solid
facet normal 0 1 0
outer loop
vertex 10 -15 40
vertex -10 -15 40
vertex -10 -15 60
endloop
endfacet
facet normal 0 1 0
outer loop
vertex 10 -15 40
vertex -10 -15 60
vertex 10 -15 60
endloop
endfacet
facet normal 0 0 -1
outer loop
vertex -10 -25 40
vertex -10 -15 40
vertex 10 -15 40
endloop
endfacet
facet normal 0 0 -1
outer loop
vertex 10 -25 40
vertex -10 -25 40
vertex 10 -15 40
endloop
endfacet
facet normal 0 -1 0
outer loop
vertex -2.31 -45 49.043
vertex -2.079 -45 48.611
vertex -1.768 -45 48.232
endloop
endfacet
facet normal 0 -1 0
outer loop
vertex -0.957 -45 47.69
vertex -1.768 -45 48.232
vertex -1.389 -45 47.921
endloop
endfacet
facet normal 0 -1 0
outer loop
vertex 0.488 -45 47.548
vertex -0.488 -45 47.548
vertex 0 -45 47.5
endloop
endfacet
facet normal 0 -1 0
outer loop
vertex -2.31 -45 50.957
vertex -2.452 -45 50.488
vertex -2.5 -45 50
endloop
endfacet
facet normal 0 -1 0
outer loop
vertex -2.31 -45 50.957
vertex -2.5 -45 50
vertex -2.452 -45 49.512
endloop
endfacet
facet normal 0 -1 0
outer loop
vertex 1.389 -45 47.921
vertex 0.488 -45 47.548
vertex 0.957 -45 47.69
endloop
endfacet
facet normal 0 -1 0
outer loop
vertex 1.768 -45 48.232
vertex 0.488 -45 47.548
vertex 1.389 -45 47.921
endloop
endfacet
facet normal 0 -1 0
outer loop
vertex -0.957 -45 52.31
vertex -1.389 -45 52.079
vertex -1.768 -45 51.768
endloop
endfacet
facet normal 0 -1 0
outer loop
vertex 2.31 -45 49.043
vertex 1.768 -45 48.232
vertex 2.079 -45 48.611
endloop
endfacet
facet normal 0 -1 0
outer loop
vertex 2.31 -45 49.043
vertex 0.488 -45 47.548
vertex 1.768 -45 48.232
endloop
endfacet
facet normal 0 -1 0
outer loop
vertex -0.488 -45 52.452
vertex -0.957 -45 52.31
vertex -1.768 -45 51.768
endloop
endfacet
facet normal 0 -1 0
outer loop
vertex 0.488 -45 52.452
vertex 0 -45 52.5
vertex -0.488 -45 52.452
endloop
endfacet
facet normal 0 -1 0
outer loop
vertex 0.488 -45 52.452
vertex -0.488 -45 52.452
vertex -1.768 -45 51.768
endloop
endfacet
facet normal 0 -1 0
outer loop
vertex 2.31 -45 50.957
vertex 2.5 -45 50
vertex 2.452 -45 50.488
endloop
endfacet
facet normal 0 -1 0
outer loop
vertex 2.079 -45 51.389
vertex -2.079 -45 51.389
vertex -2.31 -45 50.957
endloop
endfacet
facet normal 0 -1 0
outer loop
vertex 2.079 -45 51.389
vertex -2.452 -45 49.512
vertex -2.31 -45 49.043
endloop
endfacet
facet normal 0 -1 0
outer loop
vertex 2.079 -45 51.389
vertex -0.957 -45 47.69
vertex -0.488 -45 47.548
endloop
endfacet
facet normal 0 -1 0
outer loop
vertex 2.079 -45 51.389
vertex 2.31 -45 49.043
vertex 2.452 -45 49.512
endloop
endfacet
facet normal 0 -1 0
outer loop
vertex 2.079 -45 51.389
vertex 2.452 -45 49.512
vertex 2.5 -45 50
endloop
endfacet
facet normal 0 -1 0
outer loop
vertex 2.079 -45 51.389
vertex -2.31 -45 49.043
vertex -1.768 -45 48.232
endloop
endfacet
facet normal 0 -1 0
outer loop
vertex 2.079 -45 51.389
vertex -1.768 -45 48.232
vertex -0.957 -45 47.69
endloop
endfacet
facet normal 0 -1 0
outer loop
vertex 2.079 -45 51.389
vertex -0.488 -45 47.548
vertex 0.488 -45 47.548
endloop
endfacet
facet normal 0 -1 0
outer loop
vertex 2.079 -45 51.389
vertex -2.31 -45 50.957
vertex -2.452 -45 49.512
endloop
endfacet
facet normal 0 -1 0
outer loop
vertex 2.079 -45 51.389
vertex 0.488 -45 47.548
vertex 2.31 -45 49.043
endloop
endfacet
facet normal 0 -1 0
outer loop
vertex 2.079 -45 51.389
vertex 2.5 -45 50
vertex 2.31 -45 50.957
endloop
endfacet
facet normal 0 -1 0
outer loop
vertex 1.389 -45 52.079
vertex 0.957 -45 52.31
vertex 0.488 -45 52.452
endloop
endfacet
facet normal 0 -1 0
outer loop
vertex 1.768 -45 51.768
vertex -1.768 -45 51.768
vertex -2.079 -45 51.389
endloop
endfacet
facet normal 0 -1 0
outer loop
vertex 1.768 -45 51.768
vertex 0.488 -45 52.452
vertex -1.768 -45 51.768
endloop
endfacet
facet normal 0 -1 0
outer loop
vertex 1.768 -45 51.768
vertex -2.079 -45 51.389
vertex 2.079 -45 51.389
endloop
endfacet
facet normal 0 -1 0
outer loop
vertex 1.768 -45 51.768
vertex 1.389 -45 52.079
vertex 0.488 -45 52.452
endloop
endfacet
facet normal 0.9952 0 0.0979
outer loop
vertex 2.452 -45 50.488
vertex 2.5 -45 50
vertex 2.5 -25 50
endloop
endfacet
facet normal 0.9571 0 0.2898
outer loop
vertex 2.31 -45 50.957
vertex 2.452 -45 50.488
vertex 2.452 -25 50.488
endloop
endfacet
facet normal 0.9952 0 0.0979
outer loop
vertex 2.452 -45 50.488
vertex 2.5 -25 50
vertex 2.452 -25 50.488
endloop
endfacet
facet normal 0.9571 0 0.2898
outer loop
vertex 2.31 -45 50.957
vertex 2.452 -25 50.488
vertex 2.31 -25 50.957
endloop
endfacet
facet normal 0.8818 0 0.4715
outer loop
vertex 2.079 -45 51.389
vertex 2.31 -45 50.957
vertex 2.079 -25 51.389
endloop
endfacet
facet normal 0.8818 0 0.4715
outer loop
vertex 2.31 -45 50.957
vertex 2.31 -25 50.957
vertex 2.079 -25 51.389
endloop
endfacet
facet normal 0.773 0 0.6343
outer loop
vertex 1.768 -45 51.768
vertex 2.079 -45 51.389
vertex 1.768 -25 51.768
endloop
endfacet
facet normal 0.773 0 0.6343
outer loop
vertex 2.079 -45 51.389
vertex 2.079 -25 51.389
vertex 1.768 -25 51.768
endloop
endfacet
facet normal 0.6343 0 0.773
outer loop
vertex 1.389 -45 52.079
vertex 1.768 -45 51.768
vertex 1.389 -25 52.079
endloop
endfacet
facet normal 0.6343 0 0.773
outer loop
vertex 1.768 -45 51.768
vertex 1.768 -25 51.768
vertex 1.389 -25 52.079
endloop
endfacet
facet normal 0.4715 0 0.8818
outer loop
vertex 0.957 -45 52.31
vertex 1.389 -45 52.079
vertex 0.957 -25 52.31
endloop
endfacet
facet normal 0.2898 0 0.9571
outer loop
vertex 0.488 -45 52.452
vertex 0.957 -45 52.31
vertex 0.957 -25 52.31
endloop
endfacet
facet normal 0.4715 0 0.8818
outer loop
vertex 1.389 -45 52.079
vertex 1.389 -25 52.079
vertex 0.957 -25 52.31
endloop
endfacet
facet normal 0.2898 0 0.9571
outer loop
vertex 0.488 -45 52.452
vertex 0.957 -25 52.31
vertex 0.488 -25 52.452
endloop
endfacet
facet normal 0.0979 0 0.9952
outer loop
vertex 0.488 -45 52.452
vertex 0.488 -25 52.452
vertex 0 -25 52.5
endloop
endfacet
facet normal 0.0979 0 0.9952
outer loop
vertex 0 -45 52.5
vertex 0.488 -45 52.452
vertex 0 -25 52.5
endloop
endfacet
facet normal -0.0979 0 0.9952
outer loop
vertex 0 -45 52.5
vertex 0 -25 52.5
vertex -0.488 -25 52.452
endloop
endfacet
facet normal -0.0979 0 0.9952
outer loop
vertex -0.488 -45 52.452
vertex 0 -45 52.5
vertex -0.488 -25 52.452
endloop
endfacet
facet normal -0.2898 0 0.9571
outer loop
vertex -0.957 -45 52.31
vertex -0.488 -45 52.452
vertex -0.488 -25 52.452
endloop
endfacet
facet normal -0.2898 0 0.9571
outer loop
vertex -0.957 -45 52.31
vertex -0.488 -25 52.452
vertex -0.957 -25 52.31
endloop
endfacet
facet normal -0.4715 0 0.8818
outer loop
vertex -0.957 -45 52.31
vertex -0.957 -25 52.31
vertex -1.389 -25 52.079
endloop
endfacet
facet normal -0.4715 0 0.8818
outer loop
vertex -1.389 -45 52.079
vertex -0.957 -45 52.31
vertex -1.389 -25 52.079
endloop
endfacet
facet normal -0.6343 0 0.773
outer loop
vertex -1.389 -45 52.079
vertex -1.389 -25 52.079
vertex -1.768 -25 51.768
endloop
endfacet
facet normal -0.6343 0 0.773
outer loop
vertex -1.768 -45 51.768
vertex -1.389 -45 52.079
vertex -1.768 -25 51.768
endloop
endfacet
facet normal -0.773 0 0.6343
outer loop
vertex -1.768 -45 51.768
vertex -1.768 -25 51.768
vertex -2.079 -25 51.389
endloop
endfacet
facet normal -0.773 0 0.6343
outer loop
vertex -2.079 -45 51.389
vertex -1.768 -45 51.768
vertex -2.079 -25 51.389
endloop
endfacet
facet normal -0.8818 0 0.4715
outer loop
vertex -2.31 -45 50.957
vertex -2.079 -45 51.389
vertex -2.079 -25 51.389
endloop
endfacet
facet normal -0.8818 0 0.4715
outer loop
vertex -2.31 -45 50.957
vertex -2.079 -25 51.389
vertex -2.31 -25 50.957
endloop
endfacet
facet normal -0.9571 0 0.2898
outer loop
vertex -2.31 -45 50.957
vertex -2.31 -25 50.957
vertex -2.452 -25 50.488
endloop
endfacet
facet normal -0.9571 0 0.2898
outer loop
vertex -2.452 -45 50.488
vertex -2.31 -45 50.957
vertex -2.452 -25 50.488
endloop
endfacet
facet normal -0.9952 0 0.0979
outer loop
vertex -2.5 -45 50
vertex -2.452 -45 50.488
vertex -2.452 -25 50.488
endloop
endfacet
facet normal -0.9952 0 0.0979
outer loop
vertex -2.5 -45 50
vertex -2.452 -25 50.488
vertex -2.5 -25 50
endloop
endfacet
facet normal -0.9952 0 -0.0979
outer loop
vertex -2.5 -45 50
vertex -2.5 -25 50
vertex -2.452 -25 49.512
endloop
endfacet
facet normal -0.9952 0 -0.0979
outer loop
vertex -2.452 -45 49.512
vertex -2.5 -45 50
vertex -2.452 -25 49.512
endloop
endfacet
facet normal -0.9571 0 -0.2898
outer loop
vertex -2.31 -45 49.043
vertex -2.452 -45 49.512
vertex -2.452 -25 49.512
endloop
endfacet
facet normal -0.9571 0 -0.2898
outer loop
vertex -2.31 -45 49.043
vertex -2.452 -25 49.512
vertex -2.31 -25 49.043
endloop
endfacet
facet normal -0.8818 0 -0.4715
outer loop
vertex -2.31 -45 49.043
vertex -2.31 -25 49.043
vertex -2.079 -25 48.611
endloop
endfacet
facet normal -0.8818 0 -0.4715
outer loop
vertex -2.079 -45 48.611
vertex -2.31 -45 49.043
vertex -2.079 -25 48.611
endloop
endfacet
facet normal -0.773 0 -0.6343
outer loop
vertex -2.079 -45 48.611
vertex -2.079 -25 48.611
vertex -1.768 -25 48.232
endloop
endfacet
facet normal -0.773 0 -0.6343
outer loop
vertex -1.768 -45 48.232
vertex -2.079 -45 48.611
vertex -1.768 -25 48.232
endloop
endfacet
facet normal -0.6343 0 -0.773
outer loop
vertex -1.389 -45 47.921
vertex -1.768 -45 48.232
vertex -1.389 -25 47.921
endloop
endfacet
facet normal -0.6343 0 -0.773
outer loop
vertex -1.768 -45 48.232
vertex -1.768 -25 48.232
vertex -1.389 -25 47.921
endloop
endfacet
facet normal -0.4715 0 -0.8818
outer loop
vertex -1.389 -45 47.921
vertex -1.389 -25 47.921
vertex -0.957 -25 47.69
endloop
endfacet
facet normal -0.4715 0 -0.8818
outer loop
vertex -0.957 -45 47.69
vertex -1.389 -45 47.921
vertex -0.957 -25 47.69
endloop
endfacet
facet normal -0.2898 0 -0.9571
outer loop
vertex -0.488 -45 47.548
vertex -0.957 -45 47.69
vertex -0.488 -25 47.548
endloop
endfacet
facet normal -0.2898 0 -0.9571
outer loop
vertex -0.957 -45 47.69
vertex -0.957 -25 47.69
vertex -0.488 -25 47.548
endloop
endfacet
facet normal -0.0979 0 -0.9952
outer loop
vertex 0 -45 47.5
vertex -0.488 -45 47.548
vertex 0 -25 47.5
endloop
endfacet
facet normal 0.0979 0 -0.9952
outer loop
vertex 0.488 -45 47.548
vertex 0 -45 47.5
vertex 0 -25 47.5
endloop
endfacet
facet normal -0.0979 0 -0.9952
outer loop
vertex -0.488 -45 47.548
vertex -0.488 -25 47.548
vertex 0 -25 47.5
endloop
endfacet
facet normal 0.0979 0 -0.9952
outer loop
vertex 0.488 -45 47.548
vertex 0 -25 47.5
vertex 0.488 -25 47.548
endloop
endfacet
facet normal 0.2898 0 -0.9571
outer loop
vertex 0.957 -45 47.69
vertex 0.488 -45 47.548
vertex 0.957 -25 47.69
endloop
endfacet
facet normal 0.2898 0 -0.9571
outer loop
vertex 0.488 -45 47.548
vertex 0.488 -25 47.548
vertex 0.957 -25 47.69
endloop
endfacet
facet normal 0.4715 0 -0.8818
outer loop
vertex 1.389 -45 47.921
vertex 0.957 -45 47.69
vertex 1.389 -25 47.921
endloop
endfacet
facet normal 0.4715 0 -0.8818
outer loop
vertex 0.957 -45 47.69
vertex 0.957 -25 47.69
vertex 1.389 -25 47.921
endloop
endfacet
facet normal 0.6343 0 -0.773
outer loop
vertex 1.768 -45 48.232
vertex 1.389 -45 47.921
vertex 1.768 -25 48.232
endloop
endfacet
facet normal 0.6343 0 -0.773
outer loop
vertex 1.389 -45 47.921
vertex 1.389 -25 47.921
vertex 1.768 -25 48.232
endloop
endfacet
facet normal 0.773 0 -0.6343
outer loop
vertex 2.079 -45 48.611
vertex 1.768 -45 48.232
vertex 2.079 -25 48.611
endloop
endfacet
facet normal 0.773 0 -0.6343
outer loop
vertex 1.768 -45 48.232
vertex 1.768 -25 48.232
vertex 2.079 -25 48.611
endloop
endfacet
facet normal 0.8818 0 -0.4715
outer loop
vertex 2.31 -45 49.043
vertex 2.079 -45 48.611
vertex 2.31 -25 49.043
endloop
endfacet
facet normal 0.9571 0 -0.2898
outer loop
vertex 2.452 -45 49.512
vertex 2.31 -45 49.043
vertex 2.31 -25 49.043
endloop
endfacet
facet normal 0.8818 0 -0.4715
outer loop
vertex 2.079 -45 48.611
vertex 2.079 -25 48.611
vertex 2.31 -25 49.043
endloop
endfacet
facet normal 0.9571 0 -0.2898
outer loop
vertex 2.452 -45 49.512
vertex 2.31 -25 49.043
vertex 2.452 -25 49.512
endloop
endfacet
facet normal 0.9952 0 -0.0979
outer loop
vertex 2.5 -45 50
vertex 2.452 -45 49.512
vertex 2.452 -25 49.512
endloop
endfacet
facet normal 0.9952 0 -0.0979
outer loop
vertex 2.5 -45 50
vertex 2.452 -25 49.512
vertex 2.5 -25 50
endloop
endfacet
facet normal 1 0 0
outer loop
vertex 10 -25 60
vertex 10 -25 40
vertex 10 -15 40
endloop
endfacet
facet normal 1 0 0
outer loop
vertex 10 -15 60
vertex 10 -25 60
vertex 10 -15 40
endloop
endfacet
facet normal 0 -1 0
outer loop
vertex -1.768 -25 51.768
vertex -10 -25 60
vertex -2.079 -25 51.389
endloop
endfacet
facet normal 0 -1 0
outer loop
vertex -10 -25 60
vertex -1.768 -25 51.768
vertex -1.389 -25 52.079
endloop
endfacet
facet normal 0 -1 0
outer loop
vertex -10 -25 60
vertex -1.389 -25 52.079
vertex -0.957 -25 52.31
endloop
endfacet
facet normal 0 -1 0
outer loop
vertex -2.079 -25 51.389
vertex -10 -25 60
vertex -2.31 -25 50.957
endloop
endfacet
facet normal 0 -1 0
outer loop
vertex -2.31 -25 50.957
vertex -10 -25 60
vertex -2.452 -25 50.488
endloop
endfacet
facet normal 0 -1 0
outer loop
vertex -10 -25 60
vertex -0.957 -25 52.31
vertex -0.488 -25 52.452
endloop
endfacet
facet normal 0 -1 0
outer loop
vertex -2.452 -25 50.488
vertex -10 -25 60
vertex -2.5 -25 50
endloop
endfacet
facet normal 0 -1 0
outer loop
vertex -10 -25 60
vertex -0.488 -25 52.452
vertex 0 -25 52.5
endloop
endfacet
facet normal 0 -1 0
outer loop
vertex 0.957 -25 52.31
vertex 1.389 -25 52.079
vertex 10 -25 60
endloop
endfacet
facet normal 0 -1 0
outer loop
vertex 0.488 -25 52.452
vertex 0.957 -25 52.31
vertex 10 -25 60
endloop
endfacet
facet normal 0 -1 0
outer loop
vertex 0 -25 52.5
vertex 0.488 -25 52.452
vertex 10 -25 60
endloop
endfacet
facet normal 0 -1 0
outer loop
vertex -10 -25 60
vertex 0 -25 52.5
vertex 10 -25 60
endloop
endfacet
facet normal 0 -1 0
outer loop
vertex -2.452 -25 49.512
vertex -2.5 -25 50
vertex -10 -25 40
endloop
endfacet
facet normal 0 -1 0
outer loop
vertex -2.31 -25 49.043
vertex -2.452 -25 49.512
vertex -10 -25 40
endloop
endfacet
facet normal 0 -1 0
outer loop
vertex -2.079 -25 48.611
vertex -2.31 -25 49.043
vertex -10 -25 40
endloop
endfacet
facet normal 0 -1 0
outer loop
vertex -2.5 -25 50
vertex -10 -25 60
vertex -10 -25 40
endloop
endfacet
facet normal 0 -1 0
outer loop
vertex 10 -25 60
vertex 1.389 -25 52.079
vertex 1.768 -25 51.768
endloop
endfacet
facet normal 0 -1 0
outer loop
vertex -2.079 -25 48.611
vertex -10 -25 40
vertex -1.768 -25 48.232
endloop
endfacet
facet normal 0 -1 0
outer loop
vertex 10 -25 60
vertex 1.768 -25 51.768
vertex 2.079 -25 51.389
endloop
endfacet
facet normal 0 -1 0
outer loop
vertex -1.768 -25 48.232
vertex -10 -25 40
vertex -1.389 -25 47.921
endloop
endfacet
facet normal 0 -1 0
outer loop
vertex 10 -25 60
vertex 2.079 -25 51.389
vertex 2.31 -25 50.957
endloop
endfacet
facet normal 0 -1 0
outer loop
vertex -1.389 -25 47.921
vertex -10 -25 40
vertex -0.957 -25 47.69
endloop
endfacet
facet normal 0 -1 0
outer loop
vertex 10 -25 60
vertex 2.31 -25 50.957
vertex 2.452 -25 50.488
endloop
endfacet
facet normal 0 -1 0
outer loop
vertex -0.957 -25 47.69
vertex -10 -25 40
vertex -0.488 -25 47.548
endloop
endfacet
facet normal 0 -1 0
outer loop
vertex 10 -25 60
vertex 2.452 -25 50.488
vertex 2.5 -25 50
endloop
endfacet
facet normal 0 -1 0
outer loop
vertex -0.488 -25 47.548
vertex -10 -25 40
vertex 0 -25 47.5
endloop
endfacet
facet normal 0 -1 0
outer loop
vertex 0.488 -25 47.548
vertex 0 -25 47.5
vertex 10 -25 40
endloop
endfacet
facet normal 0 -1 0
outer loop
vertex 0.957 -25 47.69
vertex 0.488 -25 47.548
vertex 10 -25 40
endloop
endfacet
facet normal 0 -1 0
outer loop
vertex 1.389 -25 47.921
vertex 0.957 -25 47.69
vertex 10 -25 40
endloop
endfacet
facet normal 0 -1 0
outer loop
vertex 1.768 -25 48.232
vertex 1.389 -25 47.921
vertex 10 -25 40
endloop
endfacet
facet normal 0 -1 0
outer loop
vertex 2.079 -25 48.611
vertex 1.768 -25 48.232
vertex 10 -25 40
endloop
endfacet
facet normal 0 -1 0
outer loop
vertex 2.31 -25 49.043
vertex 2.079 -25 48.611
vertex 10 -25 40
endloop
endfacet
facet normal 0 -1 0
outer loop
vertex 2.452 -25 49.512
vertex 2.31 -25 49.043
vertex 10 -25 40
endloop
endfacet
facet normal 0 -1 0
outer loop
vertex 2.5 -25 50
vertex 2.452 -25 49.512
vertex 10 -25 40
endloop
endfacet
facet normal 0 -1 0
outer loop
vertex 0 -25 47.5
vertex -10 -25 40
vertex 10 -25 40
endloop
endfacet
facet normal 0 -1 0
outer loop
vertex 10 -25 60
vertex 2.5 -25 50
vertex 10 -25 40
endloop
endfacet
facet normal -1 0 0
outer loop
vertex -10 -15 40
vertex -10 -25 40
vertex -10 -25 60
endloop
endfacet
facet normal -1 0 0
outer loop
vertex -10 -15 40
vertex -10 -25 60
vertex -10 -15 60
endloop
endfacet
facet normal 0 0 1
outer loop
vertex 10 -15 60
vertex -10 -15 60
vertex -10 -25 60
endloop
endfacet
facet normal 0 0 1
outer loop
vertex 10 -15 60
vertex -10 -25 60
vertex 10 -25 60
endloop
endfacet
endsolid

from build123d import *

# Parameters (mm, degrees)
F0_W     = 20
F0_H     = 50
F1_DEPTH = 60
F2_R     = 2.5
F3_DEPTH = 20
F4_DEPTH = 40
F5_DEPTH = 40
F6_DEPTH = 25
F7_DEPTH = 40
F8_DEPTH = 15


# Not quite as in the source:
# - a feature names something its author has since deleted; it is built from what else it names


with BuildPart() as f1:
    # F0 (on Top) → F1 (new body)
    with BuildSketch(Plane.XY):
        Rectangle(F0_W, F0_H)
    extrude(amount=F1_DEPTH)

    # F2 (on face) → F3 (cut)
    with BuildSketch(Plane.XZ.offset(25)):
        with Locations((0, 50)):
            Circle(F2_R)
    extrude(amount=-F3_DEPTH, mode=Mode.SUBTRACT)

    # F4 (add): a face of the model
    f4_faces = [f1.faces().sort_by_distance(p)[0] for p in [
        (0, 0, 0),
    ]]
    extrude(f4_faces, amount=-F4_DEPTH)

    # F5 (cut): a face of the model
    f5_faces = [f1.faces().sort_by_distance(p)[0] for p in [
        (0, 0, 0),
    ]]
    extrude(f5_faces, amount=-F5_DEPTH, mode=Mode.SUBTRACT)

    # F6 (cut): a face of the model
    f6_faces = [f1.faces().sort_by_distance(p)[0] for p in [
        (0, 25, 50),
    ]]
    extrude(f6_faces, amount=-F6_DEPTH, mode=Mode.SUBTRACT)

    # F7 (add): a face of the model
    f7_faces = [f1.faces().sort_by_distance(p)[0] for p in [
        (0, -5, 50),
    ]]
    extrude(f7_faces, amount=F7_DEPTH)

    # F8 (cut): a face of the model
    f8_faces = [f1.faces().sort_by_distance(p)[0] for p in [
        (0, 0, 50),
    ]]
    extrude(f8_faces, amount=-F8_DEPTH, mode=Mode.SUBTRACT)


solid = f1.part
